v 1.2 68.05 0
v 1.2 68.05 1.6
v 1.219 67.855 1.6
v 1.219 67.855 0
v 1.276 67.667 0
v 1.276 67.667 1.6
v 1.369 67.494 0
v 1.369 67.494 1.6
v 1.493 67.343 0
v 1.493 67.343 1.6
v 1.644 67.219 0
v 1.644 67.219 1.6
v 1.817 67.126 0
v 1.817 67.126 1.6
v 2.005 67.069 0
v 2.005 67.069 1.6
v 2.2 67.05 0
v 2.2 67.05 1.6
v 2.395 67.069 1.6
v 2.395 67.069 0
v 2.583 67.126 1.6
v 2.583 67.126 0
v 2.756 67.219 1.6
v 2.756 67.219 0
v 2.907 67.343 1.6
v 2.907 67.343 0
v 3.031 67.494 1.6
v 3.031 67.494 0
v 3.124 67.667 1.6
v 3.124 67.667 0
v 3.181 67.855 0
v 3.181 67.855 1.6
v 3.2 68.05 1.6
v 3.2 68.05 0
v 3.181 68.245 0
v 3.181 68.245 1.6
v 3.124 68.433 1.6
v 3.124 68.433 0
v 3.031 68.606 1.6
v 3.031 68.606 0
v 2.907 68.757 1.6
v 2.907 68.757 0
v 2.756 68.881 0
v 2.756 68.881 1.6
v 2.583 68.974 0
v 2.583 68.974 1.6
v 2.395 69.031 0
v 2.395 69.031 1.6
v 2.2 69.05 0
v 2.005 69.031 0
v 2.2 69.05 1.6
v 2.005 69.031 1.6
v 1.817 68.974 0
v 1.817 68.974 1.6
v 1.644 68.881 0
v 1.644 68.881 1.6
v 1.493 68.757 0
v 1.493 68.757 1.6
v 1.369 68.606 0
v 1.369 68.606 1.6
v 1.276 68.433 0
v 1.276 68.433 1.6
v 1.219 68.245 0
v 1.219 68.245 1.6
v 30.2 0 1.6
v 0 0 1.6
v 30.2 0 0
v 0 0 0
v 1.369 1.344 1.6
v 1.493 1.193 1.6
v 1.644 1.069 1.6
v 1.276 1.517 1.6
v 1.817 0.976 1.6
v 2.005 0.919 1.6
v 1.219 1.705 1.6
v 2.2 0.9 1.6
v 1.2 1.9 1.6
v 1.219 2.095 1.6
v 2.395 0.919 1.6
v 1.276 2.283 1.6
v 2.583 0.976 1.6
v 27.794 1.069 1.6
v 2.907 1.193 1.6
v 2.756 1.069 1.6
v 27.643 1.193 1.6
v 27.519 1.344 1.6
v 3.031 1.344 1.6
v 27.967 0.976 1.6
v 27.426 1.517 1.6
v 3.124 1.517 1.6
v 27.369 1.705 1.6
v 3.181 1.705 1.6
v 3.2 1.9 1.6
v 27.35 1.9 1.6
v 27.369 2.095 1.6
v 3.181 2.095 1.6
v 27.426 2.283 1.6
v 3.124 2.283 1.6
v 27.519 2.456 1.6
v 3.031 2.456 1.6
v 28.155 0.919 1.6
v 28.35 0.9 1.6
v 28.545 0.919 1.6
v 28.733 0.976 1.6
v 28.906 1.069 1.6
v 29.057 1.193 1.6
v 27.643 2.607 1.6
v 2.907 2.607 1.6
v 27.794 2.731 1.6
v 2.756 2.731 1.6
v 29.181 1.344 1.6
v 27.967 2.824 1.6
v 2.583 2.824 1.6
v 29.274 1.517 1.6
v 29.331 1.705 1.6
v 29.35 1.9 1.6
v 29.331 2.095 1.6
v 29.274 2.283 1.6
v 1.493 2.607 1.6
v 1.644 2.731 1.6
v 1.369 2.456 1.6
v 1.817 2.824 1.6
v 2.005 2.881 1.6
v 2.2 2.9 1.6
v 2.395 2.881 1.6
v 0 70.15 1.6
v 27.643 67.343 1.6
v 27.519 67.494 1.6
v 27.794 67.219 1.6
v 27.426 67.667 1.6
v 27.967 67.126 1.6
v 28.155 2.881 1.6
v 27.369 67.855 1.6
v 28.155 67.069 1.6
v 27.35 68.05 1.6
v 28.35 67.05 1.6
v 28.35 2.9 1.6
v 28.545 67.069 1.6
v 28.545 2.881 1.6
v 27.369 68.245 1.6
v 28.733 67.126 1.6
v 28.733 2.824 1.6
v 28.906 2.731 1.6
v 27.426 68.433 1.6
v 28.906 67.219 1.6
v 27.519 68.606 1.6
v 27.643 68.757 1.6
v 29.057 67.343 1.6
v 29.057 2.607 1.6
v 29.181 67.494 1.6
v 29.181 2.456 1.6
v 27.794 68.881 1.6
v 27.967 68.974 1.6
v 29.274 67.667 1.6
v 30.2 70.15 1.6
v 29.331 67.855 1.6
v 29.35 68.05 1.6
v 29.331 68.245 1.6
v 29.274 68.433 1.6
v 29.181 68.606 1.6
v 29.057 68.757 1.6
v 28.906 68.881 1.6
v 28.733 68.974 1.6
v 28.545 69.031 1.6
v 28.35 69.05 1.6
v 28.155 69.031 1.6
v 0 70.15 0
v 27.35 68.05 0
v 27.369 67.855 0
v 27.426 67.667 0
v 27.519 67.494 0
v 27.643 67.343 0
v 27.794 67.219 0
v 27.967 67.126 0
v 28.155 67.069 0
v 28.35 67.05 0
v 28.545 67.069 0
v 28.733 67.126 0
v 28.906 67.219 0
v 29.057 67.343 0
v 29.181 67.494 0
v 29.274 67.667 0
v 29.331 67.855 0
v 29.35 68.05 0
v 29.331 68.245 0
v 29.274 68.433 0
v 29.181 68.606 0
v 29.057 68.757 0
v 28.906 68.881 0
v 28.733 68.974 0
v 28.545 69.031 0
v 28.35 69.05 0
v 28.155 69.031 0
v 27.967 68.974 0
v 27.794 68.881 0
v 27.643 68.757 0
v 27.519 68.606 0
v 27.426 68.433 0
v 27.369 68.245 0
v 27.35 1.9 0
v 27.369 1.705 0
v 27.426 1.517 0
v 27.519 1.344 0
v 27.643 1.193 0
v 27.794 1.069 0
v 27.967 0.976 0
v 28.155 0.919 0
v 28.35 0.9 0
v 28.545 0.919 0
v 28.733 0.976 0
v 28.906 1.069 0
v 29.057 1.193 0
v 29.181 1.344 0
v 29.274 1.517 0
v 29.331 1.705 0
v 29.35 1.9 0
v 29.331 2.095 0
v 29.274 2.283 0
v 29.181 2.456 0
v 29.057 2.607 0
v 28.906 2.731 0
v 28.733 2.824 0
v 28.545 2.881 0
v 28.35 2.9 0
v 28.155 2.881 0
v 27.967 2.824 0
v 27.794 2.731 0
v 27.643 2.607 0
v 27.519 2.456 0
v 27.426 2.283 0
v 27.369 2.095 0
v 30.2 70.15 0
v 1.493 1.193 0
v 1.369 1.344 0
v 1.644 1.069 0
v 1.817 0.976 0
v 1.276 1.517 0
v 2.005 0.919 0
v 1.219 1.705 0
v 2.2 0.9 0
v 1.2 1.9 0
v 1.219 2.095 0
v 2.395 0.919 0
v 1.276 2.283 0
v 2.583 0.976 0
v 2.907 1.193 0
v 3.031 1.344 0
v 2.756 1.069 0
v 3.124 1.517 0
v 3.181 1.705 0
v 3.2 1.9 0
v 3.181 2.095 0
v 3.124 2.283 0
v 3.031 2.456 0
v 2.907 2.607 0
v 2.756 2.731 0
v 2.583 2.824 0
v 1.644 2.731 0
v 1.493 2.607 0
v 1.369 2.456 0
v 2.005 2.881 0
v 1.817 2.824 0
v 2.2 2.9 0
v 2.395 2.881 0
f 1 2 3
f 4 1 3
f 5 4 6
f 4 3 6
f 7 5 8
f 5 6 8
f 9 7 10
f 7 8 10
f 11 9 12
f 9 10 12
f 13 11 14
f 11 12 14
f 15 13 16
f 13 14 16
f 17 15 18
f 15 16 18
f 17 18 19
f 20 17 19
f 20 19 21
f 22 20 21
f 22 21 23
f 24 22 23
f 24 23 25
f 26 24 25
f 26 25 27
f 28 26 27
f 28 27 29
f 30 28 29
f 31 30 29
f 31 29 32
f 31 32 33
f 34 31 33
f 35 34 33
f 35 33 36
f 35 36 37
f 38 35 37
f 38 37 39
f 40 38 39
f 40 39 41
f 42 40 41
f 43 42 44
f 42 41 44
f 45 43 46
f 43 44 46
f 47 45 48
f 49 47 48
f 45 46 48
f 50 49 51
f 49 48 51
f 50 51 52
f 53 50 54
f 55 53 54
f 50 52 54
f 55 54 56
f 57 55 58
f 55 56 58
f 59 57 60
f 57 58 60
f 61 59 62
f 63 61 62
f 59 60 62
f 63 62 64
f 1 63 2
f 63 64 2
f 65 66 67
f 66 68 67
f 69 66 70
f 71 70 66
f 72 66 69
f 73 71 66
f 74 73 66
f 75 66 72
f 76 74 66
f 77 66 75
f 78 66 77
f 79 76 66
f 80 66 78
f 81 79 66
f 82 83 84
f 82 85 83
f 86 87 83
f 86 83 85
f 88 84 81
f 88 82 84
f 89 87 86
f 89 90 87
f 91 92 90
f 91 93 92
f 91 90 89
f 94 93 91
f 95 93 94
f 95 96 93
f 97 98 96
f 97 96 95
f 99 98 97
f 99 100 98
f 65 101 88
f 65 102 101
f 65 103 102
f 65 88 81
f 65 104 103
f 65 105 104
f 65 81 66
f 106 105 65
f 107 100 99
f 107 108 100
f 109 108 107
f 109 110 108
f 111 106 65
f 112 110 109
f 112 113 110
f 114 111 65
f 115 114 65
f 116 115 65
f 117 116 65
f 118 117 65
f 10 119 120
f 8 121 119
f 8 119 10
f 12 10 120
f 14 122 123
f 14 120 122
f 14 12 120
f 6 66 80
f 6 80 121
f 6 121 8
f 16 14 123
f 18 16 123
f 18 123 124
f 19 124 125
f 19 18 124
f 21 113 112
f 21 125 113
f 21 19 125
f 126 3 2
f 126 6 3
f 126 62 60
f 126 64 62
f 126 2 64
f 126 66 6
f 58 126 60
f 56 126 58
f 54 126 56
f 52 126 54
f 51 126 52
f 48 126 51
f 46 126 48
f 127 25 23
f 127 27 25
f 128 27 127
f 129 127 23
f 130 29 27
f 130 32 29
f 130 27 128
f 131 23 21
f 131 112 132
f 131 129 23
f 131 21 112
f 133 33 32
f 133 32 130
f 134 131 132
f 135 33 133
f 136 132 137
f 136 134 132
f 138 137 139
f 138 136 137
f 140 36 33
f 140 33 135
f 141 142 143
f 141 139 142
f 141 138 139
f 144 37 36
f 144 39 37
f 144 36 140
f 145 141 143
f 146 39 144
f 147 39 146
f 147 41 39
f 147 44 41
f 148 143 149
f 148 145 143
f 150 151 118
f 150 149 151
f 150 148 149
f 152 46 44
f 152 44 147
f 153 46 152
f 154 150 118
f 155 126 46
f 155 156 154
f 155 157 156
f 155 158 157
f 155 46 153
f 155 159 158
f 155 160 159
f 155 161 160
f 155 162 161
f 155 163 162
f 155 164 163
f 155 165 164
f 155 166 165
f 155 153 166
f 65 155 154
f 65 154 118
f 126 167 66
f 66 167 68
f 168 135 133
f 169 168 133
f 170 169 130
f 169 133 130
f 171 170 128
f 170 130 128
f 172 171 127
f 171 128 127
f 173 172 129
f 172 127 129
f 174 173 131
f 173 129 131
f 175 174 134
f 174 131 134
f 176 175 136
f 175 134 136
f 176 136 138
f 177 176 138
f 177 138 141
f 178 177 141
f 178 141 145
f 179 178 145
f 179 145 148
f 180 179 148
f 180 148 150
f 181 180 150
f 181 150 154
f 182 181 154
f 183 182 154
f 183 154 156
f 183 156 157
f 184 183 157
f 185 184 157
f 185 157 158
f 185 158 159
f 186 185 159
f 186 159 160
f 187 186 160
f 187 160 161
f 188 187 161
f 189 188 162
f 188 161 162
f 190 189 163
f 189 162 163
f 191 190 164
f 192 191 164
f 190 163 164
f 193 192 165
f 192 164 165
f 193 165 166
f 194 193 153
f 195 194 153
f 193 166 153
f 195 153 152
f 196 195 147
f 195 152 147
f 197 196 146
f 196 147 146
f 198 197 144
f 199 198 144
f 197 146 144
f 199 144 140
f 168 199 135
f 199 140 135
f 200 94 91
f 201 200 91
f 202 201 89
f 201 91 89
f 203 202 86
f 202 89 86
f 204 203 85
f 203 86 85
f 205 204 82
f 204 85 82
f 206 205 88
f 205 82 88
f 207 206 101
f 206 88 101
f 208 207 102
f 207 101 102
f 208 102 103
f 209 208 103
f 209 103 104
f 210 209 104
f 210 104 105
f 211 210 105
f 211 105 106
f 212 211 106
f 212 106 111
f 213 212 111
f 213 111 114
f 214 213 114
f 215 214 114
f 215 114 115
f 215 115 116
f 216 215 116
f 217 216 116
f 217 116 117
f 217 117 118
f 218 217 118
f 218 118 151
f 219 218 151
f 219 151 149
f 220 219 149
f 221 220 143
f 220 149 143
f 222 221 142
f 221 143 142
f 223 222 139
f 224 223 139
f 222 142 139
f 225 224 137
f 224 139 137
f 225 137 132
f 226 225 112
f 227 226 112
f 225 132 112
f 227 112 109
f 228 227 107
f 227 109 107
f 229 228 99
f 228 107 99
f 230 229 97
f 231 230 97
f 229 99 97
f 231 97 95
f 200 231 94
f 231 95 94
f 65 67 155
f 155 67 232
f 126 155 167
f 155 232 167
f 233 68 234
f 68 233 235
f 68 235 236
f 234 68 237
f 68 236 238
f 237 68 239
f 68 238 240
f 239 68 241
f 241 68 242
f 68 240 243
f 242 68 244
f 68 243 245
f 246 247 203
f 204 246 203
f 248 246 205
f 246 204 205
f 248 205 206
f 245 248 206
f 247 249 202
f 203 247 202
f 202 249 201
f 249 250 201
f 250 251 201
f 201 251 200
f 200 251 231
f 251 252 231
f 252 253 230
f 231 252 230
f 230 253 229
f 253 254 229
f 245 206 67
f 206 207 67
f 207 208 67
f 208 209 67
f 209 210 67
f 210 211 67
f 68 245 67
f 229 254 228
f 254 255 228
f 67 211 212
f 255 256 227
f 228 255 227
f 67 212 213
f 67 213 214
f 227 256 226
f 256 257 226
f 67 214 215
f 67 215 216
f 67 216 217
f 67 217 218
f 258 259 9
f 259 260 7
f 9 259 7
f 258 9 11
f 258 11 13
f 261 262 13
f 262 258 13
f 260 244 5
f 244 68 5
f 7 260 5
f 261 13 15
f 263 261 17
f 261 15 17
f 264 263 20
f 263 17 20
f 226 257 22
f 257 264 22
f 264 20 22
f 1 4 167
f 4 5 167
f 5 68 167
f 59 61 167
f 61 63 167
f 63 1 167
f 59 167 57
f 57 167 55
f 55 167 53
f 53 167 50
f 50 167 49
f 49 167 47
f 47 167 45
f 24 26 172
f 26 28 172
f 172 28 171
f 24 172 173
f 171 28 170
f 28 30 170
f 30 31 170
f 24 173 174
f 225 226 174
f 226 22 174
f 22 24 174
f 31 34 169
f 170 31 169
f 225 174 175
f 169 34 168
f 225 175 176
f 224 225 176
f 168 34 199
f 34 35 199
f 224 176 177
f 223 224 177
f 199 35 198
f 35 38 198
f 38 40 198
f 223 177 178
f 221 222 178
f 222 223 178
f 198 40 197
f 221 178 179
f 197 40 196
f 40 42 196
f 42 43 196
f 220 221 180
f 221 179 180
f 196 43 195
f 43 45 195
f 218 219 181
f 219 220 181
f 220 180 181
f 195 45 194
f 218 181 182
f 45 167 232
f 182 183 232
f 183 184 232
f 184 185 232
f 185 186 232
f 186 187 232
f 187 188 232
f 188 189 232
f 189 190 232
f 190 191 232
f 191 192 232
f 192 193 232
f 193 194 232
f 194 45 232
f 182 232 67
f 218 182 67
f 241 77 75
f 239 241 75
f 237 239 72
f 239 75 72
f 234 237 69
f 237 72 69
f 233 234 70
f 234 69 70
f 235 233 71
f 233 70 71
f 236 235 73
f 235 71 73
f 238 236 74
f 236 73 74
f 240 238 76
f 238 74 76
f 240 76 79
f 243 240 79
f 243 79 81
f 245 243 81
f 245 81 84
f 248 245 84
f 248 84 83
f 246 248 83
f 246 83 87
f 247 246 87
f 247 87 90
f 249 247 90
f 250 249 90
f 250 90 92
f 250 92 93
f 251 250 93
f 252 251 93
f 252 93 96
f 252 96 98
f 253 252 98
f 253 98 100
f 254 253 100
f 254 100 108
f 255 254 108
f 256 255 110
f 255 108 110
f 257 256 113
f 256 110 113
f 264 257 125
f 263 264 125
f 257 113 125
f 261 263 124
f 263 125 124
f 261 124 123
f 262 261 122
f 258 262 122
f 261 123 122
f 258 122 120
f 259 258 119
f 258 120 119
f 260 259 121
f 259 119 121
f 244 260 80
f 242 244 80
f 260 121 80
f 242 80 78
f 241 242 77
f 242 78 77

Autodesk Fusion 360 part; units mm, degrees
sketch "Sketch1" plane through (0, 0, 0) normal (0, 0, 1) x (1, 0, 0)
  line L0 (0, 0) -> (30.2, 0)
  line L1 (30.2, 0) -> (30.2, 70.15)
  line L2 (30.2, 70.15) -> (0, 70.15)
  line L3 (0, 70.15) -> (0, 0)
  dimension "d1" = 30.2
  dimension "d2" = 70.15
extrude "Extrude1" add sketch "Sketch1" along normal blind 1.6
sketch "Sketch3" plane through (0, 0, 1.6) normal (0, 0, 1) x (-1, 0, 0)
  line L0 (0, -70.15) -> (0, 0)
  line L1 (0, 0) -> (-30.2, 0)
  line L2 (-30.2, 0) -> (-30.2, -70.15)
  line L3 (-30.2, -70.15) -> (0, -70.15)
  circle A0 centre (-2.2, -68.05) radius 1
  circle A1 centre (-28.35, -68.05) radius 1
  circle A2 centre (-2.2, -1.9) radius 1
  circle A3 centre (-28.35, -1.9) radius 1
  dimension "d7" = 2
  dimension "d12" = -26.15
  dimension "d13" = 66.15
extrude "Extrude2" cut sketch "Sketch3" against normal blind 1.6 contours A0 | A1 | A2 | A3
